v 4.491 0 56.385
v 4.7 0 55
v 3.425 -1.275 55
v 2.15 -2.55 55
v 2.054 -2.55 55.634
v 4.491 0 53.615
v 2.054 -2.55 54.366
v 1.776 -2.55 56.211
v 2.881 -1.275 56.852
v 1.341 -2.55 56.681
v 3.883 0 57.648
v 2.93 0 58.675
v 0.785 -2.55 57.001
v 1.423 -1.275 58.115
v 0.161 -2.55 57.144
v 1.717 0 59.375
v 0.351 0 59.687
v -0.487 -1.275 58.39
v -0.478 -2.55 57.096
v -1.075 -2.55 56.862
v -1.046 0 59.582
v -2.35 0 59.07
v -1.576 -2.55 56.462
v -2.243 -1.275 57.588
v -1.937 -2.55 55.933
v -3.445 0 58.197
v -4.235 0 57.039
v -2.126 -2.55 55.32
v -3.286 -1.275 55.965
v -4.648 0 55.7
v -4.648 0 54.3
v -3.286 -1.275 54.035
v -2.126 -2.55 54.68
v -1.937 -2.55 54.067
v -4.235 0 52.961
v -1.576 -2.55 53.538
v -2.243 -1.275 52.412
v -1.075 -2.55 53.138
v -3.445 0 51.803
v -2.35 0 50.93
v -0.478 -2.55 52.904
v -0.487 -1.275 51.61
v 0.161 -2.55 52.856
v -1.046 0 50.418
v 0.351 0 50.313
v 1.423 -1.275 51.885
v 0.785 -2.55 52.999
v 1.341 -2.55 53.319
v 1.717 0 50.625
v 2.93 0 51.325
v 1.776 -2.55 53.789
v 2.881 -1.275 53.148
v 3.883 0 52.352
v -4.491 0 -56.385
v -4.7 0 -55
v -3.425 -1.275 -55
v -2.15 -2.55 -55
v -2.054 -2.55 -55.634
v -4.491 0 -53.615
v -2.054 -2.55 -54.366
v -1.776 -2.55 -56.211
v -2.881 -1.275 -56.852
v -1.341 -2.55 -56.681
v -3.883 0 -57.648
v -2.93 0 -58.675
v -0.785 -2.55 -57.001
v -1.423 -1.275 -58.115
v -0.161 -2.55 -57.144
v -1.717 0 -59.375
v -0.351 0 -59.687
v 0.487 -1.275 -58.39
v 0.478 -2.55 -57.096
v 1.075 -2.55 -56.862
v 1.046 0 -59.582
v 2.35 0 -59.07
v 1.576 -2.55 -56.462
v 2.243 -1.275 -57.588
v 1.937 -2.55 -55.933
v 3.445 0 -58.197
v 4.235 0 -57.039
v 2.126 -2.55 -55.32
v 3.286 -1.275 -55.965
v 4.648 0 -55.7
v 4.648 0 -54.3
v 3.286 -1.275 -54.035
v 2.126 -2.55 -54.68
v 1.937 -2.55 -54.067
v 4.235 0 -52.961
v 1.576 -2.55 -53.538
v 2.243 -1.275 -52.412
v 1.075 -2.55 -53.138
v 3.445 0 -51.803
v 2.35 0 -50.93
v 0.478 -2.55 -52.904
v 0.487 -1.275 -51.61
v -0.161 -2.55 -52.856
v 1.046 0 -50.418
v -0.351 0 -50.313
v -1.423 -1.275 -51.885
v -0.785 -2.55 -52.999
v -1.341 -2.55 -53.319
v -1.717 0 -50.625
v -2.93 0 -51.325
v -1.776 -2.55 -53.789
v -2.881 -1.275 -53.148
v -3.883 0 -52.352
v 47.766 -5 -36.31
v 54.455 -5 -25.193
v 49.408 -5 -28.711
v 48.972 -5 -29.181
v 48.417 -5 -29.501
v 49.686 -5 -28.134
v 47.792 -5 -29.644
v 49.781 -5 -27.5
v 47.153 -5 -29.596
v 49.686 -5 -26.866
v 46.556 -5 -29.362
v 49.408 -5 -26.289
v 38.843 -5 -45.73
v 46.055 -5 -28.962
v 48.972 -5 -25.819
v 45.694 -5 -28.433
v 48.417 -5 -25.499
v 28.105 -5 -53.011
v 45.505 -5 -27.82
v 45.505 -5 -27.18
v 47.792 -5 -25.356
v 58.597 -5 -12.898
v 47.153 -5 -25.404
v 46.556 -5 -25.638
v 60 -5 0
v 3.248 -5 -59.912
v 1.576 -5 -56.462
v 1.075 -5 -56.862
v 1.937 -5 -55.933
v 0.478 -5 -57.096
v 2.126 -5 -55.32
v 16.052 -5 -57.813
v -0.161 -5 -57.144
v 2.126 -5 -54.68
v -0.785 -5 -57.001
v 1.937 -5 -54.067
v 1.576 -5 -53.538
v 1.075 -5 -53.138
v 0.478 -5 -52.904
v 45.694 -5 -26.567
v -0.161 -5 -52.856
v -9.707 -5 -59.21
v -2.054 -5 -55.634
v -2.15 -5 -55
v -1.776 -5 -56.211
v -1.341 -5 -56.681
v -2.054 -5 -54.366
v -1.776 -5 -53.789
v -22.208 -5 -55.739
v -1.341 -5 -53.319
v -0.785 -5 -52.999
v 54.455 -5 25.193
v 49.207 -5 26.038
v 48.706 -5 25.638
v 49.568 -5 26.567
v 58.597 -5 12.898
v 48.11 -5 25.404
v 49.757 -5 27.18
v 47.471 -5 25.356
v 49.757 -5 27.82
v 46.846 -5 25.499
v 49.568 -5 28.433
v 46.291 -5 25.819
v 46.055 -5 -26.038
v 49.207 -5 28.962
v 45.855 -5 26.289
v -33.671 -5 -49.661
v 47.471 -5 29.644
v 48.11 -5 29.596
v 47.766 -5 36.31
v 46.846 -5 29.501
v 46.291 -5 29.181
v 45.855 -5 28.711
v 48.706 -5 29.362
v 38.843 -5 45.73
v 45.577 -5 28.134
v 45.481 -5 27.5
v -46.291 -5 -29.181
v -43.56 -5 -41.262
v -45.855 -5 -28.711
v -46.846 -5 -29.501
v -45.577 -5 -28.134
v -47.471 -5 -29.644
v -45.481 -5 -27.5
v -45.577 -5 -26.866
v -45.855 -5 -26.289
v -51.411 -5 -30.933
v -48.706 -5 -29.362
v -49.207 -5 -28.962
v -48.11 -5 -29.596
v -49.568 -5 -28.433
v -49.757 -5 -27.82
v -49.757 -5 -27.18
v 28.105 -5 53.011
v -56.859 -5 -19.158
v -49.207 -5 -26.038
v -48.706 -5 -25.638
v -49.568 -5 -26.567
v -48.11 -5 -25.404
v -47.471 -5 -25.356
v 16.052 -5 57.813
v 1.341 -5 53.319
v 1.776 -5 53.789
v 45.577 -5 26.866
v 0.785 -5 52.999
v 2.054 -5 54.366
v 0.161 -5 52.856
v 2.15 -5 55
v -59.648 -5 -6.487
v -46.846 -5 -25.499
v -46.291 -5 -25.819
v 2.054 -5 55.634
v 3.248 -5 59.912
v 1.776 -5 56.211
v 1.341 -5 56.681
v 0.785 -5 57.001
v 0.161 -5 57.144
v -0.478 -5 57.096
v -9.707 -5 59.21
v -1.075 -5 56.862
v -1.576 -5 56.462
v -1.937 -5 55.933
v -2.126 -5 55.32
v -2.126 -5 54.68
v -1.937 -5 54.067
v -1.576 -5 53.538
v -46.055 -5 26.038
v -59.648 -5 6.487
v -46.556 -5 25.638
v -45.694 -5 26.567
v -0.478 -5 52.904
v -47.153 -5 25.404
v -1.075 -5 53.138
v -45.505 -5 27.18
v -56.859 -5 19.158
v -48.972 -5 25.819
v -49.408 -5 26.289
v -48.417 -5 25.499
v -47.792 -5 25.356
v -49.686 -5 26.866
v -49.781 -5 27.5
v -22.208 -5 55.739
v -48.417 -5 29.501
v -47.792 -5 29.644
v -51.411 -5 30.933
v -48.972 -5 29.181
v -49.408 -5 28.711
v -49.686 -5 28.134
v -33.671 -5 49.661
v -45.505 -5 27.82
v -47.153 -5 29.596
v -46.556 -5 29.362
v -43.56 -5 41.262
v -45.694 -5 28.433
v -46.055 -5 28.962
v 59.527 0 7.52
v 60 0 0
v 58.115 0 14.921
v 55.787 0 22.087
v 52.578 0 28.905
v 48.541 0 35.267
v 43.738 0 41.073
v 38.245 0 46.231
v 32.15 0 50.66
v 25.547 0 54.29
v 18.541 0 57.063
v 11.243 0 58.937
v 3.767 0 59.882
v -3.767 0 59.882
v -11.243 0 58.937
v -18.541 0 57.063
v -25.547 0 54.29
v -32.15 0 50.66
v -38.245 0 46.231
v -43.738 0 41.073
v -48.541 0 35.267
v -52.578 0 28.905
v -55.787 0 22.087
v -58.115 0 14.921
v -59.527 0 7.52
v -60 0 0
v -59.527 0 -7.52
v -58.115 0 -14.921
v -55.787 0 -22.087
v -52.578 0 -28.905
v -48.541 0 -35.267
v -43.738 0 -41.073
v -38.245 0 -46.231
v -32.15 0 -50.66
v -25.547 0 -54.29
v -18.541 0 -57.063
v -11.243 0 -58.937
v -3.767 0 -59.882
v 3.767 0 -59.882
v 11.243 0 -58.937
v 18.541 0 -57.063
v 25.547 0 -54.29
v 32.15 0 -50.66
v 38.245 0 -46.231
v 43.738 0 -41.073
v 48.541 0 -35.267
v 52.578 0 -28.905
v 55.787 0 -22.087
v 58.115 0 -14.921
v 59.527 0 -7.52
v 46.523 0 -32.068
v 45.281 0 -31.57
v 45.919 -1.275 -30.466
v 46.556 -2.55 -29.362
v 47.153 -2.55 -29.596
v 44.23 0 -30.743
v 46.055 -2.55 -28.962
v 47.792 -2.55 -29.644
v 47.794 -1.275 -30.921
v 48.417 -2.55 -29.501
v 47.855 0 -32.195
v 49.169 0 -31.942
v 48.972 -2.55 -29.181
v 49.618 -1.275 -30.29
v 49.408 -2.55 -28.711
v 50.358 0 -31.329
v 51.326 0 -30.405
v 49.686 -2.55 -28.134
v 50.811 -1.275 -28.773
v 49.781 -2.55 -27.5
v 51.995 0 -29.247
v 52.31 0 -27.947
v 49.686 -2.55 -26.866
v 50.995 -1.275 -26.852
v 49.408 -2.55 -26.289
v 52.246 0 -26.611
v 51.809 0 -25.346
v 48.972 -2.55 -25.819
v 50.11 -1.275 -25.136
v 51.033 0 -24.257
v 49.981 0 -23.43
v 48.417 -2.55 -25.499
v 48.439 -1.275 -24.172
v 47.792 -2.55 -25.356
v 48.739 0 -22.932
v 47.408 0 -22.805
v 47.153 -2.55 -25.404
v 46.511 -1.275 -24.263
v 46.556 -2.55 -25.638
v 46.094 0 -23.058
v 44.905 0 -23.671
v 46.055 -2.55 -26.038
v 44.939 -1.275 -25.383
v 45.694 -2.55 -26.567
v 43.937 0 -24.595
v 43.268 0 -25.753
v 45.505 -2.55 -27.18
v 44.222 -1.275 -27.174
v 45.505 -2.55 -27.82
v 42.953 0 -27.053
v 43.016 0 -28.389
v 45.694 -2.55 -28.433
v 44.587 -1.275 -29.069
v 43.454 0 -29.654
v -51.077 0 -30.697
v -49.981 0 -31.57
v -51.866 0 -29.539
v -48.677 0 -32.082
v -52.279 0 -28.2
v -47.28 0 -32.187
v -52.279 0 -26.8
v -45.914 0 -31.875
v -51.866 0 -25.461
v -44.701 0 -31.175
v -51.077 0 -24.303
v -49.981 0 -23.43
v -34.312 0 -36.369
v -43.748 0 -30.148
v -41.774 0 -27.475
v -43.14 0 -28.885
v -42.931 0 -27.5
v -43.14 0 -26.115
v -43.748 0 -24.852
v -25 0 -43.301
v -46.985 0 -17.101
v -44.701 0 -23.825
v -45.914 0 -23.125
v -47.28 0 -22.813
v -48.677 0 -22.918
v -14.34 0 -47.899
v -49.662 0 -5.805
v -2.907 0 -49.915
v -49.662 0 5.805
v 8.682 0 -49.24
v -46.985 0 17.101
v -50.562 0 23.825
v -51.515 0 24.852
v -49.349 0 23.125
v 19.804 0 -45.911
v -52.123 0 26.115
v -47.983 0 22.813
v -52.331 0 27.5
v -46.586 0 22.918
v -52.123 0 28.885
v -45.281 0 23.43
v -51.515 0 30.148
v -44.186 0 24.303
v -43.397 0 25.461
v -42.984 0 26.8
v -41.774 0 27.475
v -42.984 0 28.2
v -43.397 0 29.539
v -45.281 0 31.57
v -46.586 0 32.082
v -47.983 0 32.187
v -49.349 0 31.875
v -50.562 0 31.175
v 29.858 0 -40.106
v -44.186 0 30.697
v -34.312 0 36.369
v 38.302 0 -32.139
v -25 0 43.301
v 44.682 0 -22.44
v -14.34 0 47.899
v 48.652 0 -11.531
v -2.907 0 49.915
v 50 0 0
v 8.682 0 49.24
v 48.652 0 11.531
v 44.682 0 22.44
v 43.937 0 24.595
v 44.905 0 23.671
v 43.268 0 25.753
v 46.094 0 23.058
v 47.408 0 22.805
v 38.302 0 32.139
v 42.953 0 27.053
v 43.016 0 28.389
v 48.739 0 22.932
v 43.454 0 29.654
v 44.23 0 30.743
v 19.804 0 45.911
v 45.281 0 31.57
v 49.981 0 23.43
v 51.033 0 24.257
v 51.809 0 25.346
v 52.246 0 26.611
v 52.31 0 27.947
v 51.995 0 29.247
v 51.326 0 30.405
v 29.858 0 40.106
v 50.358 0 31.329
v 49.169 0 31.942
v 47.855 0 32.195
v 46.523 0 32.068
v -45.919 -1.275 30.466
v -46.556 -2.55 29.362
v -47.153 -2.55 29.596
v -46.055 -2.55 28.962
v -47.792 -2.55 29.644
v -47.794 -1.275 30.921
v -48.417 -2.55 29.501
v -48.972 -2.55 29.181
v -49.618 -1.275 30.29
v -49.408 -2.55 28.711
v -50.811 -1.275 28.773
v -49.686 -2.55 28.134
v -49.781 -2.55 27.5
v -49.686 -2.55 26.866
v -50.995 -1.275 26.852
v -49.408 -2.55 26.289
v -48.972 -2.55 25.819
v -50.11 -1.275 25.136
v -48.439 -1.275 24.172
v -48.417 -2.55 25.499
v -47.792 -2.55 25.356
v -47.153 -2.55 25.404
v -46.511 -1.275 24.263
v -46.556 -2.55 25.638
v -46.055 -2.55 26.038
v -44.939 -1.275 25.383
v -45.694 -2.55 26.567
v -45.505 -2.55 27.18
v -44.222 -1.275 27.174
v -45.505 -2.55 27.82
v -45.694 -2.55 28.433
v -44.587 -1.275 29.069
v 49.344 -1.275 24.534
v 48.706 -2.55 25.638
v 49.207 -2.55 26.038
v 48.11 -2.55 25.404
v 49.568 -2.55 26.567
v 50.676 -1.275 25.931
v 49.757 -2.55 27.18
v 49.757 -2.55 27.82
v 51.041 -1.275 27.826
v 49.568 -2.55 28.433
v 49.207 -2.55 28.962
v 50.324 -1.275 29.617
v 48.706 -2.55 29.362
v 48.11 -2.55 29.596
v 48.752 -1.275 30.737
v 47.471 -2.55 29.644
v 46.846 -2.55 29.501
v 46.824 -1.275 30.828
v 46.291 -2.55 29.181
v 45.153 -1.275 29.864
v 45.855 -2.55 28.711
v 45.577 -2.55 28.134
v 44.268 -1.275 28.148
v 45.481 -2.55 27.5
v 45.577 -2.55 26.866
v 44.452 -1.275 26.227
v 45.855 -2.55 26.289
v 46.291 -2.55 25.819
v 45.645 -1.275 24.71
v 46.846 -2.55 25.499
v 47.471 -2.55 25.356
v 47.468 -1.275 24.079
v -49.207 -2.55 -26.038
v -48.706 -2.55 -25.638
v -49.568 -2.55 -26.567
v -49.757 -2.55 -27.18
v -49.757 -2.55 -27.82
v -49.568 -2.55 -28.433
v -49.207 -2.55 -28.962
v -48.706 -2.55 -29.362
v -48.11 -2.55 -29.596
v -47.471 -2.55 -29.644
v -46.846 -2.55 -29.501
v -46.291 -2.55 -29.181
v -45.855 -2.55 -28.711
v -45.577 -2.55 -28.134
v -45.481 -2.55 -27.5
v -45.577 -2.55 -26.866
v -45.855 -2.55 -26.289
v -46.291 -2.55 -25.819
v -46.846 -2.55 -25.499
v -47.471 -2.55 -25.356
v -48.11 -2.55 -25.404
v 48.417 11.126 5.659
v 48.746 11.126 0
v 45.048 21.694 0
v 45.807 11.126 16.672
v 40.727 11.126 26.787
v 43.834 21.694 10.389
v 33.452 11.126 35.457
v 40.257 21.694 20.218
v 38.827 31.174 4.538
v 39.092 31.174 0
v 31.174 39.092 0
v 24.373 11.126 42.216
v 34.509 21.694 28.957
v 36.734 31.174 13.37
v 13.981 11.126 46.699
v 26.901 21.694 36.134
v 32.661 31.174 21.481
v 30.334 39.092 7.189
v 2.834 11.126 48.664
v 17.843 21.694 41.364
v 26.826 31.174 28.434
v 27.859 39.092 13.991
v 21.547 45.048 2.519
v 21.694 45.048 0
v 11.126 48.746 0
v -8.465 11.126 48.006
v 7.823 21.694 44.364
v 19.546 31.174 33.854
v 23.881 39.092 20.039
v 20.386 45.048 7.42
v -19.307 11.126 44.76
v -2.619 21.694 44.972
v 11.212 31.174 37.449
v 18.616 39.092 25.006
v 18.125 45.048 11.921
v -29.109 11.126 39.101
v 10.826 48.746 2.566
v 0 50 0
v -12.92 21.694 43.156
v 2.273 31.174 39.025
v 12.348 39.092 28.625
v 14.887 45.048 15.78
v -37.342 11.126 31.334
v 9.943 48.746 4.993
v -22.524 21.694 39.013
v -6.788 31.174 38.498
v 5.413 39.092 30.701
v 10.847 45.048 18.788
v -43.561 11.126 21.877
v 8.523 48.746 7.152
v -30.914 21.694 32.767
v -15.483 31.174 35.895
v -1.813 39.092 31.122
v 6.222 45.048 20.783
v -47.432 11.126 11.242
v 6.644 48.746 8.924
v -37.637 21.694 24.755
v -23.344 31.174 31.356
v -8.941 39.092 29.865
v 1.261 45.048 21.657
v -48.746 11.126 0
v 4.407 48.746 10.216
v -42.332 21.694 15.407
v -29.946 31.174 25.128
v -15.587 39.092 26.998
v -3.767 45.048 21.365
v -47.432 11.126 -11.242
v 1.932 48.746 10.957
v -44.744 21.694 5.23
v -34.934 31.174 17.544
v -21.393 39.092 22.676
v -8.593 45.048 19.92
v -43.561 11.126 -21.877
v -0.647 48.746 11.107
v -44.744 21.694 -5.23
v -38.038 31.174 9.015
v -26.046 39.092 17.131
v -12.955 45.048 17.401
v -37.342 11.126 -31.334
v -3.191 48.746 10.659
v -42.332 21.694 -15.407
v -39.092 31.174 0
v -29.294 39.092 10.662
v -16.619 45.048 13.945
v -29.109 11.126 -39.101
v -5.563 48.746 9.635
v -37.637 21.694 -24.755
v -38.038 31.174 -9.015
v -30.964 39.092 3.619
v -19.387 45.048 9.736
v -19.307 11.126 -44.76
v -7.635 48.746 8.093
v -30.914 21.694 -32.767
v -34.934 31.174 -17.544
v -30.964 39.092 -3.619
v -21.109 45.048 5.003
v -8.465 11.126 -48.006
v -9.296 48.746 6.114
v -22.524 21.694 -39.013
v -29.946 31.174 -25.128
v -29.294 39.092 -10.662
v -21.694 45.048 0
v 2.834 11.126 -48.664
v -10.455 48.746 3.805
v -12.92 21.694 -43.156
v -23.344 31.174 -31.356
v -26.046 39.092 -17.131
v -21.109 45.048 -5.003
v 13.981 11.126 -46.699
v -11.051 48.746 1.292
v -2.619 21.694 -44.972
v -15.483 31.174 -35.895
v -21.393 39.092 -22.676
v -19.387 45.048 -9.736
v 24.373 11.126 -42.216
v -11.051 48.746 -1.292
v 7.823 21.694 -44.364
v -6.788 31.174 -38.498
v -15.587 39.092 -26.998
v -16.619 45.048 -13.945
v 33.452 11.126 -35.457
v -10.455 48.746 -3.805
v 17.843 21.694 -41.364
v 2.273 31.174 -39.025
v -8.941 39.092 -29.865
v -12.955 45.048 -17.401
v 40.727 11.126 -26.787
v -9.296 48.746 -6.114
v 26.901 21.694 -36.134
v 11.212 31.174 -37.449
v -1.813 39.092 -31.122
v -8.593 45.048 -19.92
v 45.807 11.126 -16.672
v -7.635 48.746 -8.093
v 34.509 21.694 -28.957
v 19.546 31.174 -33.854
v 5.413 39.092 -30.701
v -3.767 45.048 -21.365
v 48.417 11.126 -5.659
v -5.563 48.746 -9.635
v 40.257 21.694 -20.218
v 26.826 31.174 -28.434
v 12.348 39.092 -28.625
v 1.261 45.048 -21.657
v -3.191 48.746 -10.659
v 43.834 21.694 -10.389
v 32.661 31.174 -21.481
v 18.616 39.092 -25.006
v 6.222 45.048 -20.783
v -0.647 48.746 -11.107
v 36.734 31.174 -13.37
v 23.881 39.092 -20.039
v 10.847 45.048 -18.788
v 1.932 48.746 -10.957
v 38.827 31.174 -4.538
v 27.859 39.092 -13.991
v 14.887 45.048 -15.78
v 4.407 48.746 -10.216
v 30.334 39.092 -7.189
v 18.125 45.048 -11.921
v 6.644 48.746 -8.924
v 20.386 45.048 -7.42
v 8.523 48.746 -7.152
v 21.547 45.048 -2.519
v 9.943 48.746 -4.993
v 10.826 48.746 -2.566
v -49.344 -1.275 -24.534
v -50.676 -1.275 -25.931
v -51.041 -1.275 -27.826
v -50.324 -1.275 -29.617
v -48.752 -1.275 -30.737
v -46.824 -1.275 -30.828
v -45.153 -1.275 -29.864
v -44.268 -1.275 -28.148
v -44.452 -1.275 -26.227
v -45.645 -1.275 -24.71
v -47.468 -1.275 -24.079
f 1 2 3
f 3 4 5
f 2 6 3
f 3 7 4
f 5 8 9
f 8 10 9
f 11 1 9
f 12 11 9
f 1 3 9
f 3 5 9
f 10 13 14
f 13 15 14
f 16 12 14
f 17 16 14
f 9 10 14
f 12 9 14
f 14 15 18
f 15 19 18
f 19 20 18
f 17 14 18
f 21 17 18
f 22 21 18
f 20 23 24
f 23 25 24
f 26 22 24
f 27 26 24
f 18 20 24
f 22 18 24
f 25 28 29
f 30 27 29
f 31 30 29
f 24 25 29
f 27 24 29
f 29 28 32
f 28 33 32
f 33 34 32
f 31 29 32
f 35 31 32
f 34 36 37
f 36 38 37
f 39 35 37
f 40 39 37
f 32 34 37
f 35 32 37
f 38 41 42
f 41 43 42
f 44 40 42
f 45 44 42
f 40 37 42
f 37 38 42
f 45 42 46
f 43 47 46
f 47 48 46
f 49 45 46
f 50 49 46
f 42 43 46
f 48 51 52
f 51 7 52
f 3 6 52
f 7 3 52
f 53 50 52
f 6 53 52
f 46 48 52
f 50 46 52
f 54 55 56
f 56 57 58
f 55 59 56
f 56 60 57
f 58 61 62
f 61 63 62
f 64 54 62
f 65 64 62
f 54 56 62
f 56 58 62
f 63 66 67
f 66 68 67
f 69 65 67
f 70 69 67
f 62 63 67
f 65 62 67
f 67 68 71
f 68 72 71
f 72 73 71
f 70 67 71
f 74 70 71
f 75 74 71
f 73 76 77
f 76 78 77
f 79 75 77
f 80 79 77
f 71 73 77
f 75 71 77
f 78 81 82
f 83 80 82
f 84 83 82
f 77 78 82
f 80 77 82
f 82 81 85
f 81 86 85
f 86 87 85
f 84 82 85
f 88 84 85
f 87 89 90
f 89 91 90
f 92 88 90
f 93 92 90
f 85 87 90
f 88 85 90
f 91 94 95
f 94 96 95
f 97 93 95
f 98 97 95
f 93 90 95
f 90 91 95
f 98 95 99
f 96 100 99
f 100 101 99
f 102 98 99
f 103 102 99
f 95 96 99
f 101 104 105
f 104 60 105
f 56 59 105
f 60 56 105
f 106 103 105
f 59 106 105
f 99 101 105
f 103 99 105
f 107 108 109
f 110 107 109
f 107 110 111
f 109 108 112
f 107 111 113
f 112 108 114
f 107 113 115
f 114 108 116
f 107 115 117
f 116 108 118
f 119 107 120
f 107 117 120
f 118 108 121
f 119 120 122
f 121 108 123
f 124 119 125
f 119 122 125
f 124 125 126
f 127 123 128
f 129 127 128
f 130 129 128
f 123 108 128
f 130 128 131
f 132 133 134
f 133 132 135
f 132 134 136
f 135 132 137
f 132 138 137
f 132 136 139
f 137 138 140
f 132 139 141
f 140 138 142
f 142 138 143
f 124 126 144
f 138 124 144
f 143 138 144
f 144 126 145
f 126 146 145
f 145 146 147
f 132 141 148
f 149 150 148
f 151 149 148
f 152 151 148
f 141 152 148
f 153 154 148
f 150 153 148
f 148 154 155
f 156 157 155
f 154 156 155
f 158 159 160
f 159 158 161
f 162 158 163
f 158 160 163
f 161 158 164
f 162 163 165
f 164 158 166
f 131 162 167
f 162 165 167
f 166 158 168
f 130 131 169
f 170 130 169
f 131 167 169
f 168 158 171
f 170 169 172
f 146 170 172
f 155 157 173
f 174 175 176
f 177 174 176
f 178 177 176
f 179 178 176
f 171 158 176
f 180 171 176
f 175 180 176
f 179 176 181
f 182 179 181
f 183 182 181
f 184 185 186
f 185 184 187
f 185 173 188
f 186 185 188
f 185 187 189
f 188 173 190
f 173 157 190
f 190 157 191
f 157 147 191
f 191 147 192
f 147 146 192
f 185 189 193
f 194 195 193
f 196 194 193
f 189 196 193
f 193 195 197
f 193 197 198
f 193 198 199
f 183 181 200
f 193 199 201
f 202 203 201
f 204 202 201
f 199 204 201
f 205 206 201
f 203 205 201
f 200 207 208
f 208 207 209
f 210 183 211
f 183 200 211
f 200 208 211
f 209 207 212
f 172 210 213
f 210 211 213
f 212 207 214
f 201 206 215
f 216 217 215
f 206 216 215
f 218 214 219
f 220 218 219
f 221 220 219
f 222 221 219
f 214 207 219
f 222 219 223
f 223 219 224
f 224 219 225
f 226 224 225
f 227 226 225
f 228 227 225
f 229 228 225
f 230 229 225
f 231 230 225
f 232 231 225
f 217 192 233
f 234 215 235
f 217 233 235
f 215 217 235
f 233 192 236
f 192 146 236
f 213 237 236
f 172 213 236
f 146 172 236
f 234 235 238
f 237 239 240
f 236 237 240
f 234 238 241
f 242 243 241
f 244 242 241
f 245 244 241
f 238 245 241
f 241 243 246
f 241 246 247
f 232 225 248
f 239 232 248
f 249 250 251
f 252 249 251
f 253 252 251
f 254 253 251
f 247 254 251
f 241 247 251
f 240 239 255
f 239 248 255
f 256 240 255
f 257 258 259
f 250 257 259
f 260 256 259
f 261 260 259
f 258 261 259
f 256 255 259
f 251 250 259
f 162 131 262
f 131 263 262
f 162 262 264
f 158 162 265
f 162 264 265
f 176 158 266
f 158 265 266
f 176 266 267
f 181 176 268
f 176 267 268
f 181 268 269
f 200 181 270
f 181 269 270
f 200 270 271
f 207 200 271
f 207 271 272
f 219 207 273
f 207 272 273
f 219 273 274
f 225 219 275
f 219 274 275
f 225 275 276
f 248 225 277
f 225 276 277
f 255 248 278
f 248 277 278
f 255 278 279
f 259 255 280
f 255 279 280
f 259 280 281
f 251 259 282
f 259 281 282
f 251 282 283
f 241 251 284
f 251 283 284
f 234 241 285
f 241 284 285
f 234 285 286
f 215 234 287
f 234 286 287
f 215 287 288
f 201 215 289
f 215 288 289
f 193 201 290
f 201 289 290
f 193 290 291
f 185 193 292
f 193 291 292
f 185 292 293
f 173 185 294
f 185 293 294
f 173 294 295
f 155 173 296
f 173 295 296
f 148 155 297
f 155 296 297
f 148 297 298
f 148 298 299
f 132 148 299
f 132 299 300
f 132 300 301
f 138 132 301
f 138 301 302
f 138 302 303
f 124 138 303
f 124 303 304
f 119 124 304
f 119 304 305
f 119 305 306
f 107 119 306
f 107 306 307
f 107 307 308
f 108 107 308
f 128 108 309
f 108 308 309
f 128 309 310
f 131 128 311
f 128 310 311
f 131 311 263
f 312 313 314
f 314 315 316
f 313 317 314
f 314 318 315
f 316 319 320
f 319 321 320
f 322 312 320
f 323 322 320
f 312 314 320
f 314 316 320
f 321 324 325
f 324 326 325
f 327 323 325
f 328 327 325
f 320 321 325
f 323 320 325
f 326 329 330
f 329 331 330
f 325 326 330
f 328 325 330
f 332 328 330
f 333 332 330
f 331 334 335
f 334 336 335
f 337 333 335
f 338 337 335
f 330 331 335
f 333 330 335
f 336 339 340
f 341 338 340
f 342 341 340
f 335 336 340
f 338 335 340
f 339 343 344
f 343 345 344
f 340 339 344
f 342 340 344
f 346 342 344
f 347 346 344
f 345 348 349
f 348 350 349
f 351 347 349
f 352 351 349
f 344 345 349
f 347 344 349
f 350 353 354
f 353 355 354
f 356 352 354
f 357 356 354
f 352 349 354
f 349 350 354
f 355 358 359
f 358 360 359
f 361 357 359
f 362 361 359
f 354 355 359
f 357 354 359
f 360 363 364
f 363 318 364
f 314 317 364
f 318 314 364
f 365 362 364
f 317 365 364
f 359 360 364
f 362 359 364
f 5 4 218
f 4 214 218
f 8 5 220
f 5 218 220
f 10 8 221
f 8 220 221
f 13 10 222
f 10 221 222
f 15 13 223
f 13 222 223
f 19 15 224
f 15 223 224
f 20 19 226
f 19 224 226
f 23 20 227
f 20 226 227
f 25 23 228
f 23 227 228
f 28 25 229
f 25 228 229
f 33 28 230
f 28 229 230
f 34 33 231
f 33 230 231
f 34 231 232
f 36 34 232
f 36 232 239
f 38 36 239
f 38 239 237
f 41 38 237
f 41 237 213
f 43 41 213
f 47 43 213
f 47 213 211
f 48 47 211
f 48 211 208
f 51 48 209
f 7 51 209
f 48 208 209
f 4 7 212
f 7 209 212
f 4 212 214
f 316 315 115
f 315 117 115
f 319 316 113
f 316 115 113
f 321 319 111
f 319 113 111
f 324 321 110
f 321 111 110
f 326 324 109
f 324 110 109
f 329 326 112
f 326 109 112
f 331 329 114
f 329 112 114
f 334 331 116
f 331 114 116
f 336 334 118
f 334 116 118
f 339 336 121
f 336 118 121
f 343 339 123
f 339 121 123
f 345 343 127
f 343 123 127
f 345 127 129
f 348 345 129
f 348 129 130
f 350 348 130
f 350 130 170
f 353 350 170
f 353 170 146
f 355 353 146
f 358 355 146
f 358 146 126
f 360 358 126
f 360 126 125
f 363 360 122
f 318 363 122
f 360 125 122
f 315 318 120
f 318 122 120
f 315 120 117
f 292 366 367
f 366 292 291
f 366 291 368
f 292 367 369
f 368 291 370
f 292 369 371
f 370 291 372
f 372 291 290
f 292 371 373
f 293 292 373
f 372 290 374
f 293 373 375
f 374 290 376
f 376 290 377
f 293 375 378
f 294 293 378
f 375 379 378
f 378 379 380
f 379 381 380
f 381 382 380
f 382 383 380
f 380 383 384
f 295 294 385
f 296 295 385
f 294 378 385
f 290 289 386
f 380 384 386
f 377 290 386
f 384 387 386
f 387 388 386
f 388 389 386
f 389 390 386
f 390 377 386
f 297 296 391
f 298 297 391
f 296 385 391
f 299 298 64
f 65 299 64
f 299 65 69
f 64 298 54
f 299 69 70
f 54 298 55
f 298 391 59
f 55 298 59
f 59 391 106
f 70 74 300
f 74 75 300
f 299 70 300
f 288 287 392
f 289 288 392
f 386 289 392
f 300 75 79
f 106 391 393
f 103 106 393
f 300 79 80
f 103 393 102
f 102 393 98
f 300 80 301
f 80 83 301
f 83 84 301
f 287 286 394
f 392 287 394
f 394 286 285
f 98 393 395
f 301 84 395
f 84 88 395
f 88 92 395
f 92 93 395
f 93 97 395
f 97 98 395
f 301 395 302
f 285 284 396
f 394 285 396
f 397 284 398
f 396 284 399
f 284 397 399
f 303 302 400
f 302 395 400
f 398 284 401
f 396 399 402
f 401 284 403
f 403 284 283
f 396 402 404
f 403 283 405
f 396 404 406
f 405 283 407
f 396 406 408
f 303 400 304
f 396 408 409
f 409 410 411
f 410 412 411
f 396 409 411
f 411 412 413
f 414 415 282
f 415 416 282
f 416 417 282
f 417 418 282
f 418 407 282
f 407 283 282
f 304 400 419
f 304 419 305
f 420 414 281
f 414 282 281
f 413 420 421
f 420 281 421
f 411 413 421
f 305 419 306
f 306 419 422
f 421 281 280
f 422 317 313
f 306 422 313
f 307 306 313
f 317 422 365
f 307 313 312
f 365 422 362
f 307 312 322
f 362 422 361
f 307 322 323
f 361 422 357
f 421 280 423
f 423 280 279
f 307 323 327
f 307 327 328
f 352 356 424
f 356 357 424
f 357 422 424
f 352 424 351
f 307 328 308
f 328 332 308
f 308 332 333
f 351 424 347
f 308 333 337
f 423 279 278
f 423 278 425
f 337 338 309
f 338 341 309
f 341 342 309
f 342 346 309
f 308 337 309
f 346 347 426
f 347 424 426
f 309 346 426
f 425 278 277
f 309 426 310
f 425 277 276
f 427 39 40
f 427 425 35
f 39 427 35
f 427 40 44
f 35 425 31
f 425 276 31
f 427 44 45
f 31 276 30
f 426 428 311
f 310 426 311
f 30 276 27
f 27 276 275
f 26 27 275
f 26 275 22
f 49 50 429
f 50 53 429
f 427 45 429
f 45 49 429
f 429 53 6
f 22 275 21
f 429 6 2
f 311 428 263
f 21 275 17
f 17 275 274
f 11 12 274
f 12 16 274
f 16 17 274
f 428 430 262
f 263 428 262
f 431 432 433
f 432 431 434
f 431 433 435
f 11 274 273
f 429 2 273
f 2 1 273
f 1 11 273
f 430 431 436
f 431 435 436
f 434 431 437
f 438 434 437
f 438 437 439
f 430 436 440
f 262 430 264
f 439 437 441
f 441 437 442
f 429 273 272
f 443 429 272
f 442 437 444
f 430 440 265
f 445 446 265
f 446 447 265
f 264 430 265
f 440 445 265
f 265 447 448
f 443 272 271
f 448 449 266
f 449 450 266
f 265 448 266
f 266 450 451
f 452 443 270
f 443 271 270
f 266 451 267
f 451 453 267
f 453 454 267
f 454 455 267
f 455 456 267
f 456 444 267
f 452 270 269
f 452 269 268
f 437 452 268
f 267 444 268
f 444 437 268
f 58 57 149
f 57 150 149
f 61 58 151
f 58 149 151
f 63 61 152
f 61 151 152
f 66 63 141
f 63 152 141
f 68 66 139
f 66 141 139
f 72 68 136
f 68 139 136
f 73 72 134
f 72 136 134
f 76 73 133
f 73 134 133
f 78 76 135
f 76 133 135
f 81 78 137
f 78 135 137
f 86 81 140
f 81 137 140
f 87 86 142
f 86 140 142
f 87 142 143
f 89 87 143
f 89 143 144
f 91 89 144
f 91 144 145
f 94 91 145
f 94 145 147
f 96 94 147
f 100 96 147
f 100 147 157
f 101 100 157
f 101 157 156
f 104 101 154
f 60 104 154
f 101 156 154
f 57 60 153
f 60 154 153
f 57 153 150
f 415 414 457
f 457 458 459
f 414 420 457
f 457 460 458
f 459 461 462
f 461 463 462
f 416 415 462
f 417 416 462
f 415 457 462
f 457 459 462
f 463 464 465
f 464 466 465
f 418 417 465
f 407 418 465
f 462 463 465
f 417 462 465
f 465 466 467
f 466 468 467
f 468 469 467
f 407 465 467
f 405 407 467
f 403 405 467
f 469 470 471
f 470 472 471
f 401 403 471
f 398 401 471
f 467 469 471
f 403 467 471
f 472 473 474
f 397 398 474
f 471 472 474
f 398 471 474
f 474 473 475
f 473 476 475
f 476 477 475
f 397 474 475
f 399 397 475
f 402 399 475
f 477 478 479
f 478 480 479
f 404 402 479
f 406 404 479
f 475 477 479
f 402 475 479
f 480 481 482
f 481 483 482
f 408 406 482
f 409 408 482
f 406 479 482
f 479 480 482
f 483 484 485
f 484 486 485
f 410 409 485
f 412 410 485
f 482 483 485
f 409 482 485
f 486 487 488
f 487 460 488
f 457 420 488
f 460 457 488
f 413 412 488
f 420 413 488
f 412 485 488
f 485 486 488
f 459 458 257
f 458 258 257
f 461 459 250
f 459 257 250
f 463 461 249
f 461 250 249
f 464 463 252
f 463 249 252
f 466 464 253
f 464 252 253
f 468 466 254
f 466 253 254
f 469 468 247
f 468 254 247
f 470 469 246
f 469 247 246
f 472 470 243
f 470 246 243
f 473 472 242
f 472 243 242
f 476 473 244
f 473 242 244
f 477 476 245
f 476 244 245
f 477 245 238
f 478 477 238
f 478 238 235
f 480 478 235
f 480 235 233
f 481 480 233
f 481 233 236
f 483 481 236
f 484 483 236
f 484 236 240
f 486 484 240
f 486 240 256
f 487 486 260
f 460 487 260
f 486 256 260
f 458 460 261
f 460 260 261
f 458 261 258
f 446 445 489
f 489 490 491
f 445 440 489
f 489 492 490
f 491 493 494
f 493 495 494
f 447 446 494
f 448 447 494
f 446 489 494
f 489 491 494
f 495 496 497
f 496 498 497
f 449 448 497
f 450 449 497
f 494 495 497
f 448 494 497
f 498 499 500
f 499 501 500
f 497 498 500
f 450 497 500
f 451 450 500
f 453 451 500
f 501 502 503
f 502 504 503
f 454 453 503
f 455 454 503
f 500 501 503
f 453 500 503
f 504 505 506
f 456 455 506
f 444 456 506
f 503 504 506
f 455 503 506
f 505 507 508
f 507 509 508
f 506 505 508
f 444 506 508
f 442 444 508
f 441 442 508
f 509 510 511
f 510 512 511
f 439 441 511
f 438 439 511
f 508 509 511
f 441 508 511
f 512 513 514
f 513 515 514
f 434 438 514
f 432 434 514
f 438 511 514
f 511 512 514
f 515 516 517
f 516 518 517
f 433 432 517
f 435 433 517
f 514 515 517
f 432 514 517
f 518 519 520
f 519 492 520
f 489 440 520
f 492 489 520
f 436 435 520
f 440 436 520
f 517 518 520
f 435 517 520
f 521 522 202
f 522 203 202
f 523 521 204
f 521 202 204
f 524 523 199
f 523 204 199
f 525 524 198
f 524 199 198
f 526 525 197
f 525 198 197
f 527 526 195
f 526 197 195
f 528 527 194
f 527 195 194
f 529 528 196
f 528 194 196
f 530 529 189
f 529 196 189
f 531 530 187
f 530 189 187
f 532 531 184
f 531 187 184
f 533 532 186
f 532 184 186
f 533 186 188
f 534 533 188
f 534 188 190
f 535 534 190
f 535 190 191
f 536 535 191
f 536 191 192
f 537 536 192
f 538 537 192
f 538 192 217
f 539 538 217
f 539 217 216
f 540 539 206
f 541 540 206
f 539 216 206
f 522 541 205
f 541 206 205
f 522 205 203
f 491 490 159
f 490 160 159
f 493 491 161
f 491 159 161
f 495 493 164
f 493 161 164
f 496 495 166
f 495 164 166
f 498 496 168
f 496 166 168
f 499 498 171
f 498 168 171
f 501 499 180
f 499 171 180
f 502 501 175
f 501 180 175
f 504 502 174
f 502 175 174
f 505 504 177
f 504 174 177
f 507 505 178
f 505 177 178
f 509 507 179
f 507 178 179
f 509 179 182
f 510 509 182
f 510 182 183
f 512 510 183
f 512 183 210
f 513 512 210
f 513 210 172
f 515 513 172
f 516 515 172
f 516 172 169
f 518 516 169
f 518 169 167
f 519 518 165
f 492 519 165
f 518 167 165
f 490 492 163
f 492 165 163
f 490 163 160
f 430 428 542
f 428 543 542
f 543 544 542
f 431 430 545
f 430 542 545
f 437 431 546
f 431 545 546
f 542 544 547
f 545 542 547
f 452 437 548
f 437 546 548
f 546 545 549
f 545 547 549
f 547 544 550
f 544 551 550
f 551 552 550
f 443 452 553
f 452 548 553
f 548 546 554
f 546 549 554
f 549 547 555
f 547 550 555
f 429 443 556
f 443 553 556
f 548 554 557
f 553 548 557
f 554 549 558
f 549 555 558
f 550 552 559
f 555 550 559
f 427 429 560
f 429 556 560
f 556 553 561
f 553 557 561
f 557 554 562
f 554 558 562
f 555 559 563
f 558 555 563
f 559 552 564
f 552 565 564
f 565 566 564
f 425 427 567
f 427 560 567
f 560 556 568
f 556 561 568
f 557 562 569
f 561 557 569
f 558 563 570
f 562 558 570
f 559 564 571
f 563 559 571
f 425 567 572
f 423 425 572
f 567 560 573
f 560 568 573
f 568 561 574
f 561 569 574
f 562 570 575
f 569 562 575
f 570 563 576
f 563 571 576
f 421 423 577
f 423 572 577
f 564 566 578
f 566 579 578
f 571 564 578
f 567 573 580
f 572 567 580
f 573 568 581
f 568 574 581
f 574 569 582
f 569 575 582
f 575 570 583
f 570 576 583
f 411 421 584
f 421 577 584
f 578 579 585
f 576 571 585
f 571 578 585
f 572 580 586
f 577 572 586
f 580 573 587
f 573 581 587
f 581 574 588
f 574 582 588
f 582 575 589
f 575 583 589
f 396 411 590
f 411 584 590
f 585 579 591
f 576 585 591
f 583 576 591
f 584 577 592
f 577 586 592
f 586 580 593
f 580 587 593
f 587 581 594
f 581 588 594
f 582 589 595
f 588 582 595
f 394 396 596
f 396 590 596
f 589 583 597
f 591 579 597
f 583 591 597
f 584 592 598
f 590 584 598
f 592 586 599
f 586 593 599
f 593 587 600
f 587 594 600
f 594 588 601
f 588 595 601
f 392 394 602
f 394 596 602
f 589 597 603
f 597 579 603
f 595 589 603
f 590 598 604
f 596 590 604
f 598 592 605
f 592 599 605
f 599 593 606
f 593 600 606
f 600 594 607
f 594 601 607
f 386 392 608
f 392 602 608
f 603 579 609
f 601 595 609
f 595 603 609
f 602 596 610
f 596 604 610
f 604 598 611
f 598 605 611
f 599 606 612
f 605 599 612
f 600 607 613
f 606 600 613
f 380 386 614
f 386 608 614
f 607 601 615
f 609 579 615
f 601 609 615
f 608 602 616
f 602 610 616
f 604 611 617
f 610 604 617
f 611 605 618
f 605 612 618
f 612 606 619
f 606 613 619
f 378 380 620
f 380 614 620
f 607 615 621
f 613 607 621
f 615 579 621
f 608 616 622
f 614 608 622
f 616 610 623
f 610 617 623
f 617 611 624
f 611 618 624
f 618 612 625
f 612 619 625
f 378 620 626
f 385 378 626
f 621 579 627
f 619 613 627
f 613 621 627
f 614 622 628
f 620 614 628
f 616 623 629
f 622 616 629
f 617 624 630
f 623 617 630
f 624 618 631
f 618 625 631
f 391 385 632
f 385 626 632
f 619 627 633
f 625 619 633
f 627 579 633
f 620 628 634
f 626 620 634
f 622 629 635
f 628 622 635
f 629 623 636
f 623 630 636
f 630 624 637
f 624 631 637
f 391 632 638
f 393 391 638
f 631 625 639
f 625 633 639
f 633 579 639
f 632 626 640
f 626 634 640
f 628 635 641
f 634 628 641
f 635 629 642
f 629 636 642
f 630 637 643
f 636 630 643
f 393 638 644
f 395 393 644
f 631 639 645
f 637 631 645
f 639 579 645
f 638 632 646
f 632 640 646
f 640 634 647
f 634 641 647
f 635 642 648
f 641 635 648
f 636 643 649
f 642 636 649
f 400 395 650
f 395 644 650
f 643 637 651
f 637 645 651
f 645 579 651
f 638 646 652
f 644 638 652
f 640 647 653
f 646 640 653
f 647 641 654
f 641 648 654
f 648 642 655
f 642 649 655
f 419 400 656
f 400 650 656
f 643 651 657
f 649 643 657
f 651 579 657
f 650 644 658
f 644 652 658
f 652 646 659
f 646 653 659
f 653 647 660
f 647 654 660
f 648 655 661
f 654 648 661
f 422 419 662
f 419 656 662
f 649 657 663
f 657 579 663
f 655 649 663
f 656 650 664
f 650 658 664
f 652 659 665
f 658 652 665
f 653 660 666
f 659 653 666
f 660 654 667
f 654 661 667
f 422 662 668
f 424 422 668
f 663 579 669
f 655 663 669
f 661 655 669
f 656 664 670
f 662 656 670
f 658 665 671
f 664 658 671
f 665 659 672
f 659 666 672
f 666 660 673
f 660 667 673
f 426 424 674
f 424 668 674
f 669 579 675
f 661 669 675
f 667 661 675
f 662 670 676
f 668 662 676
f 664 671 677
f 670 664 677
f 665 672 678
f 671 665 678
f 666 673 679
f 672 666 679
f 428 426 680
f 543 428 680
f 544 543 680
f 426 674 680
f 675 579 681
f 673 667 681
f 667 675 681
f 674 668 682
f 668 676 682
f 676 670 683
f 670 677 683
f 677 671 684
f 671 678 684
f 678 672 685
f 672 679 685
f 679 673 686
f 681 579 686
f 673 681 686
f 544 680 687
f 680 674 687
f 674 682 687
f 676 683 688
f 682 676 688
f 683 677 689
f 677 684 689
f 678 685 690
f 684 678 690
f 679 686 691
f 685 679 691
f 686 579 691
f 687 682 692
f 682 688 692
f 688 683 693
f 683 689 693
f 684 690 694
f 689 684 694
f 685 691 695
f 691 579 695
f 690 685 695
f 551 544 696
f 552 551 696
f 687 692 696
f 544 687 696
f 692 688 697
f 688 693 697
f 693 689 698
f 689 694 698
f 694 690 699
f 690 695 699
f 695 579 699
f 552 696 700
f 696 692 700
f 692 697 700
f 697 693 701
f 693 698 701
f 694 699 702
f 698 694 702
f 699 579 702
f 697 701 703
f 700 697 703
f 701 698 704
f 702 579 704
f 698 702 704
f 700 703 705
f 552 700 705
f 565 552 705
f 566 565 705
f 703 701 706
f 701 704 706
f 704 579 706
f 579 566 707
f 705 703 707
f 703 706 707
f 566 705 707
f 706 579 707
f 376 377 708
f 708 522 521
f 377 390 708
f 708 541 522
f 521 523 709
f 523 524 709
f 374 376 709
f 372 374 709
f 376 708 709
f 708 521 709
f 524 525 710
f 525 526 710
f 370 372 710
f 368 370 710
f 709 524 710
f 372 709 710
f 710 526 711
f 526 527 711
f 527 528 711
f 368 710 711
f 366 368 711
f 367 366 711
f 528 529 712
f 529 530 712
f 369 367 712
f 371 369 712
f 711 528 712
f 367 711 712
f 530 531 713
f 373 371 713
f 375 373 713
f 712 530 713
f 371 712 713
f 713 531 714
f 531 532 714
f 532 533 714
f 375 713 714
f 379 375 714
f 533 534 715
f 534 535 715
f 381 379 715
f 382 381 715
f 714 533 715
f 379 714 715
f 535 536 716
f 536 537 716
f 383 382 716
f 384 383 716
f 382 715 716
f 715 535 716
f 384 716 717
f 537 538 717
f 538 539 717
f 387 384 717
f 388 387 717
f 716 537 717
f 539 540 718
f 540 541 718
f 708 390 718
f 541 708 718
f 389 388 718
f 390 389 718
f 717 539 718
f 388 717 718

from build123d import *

# Parameters (mm, degrees)
CSK_FOR_M4_COUNTERSUNK_FLAT_HEAD_SCREW1_D           = 4.3
CSK_FOR_M4_COUNTERSUNK_FLAT_HEAD_SCREW1_CSINK_D     = 9.4
CSK_FOR_M4_COUNTERSUNK_FLAT_HEAD_SCREW1_CSINK_ANGLE = 90
PATTERN_CIRCULAR_1_COUNT                            = 6


with BuildPart() as part:
    # Эскиз1 → Повернуть1 (revolve)
    with BuildSketch(Plane.XY):
        with BuildLine():
            Line((0, -5), (60, -5))
            Line((60, -5), (60, 0))
            Line((60, 0), (50, 0))
            ThreePointArc((50, 0), (35.355339059, 35.355339059), (0, 50))
            Line((0, 50), (0, -5))
        make_face()
    revolve(axis=Axis((0, 50, 0), (0, -1, 0)))

    # CSK for M4 Countersunk Flat Head Screw1 (through all)
    with Locations(Plane(origin=(0, 0, -55), x_dir=(1, 0, 0), z_dir=(0, 1, 0))):
        with Locations((0, 0)):
            csk_for_m4_countersunk_flat_head_screw1 = CounterSinkHole(CSK_FOR_M4_COUNTERSUNK_FLAT_HEAD_SCREW1_D / 2, CSK_FOR_M4_COUNTERSUNK_FLAT_HEAD_SCREW1_CSINK_D / 2, counter_sink_angle=CSK_FOR_M4_COUNTERSUNK_FLAT_HEAD_SCREW1_CSINK_ANGLE)

    # Круговой массив1: CSK for M4 Countersunk Flat Head Screw1 ×6 about axis
    pattern_circular_1_axis = Axis((0, 61.603142777, 0), (0, -1, 0))
    for i in range(1, PATTERN_CIRCULAR_1_COUNT):
        add(csk_for_m4_countersunk_flat_head_screw1.rotate(pattern_circular_1_axis, i * 360 / PATTERN_CIRCULAR_1_COUNT), mode=Mode.SUBTRACT)


solid = part.part
